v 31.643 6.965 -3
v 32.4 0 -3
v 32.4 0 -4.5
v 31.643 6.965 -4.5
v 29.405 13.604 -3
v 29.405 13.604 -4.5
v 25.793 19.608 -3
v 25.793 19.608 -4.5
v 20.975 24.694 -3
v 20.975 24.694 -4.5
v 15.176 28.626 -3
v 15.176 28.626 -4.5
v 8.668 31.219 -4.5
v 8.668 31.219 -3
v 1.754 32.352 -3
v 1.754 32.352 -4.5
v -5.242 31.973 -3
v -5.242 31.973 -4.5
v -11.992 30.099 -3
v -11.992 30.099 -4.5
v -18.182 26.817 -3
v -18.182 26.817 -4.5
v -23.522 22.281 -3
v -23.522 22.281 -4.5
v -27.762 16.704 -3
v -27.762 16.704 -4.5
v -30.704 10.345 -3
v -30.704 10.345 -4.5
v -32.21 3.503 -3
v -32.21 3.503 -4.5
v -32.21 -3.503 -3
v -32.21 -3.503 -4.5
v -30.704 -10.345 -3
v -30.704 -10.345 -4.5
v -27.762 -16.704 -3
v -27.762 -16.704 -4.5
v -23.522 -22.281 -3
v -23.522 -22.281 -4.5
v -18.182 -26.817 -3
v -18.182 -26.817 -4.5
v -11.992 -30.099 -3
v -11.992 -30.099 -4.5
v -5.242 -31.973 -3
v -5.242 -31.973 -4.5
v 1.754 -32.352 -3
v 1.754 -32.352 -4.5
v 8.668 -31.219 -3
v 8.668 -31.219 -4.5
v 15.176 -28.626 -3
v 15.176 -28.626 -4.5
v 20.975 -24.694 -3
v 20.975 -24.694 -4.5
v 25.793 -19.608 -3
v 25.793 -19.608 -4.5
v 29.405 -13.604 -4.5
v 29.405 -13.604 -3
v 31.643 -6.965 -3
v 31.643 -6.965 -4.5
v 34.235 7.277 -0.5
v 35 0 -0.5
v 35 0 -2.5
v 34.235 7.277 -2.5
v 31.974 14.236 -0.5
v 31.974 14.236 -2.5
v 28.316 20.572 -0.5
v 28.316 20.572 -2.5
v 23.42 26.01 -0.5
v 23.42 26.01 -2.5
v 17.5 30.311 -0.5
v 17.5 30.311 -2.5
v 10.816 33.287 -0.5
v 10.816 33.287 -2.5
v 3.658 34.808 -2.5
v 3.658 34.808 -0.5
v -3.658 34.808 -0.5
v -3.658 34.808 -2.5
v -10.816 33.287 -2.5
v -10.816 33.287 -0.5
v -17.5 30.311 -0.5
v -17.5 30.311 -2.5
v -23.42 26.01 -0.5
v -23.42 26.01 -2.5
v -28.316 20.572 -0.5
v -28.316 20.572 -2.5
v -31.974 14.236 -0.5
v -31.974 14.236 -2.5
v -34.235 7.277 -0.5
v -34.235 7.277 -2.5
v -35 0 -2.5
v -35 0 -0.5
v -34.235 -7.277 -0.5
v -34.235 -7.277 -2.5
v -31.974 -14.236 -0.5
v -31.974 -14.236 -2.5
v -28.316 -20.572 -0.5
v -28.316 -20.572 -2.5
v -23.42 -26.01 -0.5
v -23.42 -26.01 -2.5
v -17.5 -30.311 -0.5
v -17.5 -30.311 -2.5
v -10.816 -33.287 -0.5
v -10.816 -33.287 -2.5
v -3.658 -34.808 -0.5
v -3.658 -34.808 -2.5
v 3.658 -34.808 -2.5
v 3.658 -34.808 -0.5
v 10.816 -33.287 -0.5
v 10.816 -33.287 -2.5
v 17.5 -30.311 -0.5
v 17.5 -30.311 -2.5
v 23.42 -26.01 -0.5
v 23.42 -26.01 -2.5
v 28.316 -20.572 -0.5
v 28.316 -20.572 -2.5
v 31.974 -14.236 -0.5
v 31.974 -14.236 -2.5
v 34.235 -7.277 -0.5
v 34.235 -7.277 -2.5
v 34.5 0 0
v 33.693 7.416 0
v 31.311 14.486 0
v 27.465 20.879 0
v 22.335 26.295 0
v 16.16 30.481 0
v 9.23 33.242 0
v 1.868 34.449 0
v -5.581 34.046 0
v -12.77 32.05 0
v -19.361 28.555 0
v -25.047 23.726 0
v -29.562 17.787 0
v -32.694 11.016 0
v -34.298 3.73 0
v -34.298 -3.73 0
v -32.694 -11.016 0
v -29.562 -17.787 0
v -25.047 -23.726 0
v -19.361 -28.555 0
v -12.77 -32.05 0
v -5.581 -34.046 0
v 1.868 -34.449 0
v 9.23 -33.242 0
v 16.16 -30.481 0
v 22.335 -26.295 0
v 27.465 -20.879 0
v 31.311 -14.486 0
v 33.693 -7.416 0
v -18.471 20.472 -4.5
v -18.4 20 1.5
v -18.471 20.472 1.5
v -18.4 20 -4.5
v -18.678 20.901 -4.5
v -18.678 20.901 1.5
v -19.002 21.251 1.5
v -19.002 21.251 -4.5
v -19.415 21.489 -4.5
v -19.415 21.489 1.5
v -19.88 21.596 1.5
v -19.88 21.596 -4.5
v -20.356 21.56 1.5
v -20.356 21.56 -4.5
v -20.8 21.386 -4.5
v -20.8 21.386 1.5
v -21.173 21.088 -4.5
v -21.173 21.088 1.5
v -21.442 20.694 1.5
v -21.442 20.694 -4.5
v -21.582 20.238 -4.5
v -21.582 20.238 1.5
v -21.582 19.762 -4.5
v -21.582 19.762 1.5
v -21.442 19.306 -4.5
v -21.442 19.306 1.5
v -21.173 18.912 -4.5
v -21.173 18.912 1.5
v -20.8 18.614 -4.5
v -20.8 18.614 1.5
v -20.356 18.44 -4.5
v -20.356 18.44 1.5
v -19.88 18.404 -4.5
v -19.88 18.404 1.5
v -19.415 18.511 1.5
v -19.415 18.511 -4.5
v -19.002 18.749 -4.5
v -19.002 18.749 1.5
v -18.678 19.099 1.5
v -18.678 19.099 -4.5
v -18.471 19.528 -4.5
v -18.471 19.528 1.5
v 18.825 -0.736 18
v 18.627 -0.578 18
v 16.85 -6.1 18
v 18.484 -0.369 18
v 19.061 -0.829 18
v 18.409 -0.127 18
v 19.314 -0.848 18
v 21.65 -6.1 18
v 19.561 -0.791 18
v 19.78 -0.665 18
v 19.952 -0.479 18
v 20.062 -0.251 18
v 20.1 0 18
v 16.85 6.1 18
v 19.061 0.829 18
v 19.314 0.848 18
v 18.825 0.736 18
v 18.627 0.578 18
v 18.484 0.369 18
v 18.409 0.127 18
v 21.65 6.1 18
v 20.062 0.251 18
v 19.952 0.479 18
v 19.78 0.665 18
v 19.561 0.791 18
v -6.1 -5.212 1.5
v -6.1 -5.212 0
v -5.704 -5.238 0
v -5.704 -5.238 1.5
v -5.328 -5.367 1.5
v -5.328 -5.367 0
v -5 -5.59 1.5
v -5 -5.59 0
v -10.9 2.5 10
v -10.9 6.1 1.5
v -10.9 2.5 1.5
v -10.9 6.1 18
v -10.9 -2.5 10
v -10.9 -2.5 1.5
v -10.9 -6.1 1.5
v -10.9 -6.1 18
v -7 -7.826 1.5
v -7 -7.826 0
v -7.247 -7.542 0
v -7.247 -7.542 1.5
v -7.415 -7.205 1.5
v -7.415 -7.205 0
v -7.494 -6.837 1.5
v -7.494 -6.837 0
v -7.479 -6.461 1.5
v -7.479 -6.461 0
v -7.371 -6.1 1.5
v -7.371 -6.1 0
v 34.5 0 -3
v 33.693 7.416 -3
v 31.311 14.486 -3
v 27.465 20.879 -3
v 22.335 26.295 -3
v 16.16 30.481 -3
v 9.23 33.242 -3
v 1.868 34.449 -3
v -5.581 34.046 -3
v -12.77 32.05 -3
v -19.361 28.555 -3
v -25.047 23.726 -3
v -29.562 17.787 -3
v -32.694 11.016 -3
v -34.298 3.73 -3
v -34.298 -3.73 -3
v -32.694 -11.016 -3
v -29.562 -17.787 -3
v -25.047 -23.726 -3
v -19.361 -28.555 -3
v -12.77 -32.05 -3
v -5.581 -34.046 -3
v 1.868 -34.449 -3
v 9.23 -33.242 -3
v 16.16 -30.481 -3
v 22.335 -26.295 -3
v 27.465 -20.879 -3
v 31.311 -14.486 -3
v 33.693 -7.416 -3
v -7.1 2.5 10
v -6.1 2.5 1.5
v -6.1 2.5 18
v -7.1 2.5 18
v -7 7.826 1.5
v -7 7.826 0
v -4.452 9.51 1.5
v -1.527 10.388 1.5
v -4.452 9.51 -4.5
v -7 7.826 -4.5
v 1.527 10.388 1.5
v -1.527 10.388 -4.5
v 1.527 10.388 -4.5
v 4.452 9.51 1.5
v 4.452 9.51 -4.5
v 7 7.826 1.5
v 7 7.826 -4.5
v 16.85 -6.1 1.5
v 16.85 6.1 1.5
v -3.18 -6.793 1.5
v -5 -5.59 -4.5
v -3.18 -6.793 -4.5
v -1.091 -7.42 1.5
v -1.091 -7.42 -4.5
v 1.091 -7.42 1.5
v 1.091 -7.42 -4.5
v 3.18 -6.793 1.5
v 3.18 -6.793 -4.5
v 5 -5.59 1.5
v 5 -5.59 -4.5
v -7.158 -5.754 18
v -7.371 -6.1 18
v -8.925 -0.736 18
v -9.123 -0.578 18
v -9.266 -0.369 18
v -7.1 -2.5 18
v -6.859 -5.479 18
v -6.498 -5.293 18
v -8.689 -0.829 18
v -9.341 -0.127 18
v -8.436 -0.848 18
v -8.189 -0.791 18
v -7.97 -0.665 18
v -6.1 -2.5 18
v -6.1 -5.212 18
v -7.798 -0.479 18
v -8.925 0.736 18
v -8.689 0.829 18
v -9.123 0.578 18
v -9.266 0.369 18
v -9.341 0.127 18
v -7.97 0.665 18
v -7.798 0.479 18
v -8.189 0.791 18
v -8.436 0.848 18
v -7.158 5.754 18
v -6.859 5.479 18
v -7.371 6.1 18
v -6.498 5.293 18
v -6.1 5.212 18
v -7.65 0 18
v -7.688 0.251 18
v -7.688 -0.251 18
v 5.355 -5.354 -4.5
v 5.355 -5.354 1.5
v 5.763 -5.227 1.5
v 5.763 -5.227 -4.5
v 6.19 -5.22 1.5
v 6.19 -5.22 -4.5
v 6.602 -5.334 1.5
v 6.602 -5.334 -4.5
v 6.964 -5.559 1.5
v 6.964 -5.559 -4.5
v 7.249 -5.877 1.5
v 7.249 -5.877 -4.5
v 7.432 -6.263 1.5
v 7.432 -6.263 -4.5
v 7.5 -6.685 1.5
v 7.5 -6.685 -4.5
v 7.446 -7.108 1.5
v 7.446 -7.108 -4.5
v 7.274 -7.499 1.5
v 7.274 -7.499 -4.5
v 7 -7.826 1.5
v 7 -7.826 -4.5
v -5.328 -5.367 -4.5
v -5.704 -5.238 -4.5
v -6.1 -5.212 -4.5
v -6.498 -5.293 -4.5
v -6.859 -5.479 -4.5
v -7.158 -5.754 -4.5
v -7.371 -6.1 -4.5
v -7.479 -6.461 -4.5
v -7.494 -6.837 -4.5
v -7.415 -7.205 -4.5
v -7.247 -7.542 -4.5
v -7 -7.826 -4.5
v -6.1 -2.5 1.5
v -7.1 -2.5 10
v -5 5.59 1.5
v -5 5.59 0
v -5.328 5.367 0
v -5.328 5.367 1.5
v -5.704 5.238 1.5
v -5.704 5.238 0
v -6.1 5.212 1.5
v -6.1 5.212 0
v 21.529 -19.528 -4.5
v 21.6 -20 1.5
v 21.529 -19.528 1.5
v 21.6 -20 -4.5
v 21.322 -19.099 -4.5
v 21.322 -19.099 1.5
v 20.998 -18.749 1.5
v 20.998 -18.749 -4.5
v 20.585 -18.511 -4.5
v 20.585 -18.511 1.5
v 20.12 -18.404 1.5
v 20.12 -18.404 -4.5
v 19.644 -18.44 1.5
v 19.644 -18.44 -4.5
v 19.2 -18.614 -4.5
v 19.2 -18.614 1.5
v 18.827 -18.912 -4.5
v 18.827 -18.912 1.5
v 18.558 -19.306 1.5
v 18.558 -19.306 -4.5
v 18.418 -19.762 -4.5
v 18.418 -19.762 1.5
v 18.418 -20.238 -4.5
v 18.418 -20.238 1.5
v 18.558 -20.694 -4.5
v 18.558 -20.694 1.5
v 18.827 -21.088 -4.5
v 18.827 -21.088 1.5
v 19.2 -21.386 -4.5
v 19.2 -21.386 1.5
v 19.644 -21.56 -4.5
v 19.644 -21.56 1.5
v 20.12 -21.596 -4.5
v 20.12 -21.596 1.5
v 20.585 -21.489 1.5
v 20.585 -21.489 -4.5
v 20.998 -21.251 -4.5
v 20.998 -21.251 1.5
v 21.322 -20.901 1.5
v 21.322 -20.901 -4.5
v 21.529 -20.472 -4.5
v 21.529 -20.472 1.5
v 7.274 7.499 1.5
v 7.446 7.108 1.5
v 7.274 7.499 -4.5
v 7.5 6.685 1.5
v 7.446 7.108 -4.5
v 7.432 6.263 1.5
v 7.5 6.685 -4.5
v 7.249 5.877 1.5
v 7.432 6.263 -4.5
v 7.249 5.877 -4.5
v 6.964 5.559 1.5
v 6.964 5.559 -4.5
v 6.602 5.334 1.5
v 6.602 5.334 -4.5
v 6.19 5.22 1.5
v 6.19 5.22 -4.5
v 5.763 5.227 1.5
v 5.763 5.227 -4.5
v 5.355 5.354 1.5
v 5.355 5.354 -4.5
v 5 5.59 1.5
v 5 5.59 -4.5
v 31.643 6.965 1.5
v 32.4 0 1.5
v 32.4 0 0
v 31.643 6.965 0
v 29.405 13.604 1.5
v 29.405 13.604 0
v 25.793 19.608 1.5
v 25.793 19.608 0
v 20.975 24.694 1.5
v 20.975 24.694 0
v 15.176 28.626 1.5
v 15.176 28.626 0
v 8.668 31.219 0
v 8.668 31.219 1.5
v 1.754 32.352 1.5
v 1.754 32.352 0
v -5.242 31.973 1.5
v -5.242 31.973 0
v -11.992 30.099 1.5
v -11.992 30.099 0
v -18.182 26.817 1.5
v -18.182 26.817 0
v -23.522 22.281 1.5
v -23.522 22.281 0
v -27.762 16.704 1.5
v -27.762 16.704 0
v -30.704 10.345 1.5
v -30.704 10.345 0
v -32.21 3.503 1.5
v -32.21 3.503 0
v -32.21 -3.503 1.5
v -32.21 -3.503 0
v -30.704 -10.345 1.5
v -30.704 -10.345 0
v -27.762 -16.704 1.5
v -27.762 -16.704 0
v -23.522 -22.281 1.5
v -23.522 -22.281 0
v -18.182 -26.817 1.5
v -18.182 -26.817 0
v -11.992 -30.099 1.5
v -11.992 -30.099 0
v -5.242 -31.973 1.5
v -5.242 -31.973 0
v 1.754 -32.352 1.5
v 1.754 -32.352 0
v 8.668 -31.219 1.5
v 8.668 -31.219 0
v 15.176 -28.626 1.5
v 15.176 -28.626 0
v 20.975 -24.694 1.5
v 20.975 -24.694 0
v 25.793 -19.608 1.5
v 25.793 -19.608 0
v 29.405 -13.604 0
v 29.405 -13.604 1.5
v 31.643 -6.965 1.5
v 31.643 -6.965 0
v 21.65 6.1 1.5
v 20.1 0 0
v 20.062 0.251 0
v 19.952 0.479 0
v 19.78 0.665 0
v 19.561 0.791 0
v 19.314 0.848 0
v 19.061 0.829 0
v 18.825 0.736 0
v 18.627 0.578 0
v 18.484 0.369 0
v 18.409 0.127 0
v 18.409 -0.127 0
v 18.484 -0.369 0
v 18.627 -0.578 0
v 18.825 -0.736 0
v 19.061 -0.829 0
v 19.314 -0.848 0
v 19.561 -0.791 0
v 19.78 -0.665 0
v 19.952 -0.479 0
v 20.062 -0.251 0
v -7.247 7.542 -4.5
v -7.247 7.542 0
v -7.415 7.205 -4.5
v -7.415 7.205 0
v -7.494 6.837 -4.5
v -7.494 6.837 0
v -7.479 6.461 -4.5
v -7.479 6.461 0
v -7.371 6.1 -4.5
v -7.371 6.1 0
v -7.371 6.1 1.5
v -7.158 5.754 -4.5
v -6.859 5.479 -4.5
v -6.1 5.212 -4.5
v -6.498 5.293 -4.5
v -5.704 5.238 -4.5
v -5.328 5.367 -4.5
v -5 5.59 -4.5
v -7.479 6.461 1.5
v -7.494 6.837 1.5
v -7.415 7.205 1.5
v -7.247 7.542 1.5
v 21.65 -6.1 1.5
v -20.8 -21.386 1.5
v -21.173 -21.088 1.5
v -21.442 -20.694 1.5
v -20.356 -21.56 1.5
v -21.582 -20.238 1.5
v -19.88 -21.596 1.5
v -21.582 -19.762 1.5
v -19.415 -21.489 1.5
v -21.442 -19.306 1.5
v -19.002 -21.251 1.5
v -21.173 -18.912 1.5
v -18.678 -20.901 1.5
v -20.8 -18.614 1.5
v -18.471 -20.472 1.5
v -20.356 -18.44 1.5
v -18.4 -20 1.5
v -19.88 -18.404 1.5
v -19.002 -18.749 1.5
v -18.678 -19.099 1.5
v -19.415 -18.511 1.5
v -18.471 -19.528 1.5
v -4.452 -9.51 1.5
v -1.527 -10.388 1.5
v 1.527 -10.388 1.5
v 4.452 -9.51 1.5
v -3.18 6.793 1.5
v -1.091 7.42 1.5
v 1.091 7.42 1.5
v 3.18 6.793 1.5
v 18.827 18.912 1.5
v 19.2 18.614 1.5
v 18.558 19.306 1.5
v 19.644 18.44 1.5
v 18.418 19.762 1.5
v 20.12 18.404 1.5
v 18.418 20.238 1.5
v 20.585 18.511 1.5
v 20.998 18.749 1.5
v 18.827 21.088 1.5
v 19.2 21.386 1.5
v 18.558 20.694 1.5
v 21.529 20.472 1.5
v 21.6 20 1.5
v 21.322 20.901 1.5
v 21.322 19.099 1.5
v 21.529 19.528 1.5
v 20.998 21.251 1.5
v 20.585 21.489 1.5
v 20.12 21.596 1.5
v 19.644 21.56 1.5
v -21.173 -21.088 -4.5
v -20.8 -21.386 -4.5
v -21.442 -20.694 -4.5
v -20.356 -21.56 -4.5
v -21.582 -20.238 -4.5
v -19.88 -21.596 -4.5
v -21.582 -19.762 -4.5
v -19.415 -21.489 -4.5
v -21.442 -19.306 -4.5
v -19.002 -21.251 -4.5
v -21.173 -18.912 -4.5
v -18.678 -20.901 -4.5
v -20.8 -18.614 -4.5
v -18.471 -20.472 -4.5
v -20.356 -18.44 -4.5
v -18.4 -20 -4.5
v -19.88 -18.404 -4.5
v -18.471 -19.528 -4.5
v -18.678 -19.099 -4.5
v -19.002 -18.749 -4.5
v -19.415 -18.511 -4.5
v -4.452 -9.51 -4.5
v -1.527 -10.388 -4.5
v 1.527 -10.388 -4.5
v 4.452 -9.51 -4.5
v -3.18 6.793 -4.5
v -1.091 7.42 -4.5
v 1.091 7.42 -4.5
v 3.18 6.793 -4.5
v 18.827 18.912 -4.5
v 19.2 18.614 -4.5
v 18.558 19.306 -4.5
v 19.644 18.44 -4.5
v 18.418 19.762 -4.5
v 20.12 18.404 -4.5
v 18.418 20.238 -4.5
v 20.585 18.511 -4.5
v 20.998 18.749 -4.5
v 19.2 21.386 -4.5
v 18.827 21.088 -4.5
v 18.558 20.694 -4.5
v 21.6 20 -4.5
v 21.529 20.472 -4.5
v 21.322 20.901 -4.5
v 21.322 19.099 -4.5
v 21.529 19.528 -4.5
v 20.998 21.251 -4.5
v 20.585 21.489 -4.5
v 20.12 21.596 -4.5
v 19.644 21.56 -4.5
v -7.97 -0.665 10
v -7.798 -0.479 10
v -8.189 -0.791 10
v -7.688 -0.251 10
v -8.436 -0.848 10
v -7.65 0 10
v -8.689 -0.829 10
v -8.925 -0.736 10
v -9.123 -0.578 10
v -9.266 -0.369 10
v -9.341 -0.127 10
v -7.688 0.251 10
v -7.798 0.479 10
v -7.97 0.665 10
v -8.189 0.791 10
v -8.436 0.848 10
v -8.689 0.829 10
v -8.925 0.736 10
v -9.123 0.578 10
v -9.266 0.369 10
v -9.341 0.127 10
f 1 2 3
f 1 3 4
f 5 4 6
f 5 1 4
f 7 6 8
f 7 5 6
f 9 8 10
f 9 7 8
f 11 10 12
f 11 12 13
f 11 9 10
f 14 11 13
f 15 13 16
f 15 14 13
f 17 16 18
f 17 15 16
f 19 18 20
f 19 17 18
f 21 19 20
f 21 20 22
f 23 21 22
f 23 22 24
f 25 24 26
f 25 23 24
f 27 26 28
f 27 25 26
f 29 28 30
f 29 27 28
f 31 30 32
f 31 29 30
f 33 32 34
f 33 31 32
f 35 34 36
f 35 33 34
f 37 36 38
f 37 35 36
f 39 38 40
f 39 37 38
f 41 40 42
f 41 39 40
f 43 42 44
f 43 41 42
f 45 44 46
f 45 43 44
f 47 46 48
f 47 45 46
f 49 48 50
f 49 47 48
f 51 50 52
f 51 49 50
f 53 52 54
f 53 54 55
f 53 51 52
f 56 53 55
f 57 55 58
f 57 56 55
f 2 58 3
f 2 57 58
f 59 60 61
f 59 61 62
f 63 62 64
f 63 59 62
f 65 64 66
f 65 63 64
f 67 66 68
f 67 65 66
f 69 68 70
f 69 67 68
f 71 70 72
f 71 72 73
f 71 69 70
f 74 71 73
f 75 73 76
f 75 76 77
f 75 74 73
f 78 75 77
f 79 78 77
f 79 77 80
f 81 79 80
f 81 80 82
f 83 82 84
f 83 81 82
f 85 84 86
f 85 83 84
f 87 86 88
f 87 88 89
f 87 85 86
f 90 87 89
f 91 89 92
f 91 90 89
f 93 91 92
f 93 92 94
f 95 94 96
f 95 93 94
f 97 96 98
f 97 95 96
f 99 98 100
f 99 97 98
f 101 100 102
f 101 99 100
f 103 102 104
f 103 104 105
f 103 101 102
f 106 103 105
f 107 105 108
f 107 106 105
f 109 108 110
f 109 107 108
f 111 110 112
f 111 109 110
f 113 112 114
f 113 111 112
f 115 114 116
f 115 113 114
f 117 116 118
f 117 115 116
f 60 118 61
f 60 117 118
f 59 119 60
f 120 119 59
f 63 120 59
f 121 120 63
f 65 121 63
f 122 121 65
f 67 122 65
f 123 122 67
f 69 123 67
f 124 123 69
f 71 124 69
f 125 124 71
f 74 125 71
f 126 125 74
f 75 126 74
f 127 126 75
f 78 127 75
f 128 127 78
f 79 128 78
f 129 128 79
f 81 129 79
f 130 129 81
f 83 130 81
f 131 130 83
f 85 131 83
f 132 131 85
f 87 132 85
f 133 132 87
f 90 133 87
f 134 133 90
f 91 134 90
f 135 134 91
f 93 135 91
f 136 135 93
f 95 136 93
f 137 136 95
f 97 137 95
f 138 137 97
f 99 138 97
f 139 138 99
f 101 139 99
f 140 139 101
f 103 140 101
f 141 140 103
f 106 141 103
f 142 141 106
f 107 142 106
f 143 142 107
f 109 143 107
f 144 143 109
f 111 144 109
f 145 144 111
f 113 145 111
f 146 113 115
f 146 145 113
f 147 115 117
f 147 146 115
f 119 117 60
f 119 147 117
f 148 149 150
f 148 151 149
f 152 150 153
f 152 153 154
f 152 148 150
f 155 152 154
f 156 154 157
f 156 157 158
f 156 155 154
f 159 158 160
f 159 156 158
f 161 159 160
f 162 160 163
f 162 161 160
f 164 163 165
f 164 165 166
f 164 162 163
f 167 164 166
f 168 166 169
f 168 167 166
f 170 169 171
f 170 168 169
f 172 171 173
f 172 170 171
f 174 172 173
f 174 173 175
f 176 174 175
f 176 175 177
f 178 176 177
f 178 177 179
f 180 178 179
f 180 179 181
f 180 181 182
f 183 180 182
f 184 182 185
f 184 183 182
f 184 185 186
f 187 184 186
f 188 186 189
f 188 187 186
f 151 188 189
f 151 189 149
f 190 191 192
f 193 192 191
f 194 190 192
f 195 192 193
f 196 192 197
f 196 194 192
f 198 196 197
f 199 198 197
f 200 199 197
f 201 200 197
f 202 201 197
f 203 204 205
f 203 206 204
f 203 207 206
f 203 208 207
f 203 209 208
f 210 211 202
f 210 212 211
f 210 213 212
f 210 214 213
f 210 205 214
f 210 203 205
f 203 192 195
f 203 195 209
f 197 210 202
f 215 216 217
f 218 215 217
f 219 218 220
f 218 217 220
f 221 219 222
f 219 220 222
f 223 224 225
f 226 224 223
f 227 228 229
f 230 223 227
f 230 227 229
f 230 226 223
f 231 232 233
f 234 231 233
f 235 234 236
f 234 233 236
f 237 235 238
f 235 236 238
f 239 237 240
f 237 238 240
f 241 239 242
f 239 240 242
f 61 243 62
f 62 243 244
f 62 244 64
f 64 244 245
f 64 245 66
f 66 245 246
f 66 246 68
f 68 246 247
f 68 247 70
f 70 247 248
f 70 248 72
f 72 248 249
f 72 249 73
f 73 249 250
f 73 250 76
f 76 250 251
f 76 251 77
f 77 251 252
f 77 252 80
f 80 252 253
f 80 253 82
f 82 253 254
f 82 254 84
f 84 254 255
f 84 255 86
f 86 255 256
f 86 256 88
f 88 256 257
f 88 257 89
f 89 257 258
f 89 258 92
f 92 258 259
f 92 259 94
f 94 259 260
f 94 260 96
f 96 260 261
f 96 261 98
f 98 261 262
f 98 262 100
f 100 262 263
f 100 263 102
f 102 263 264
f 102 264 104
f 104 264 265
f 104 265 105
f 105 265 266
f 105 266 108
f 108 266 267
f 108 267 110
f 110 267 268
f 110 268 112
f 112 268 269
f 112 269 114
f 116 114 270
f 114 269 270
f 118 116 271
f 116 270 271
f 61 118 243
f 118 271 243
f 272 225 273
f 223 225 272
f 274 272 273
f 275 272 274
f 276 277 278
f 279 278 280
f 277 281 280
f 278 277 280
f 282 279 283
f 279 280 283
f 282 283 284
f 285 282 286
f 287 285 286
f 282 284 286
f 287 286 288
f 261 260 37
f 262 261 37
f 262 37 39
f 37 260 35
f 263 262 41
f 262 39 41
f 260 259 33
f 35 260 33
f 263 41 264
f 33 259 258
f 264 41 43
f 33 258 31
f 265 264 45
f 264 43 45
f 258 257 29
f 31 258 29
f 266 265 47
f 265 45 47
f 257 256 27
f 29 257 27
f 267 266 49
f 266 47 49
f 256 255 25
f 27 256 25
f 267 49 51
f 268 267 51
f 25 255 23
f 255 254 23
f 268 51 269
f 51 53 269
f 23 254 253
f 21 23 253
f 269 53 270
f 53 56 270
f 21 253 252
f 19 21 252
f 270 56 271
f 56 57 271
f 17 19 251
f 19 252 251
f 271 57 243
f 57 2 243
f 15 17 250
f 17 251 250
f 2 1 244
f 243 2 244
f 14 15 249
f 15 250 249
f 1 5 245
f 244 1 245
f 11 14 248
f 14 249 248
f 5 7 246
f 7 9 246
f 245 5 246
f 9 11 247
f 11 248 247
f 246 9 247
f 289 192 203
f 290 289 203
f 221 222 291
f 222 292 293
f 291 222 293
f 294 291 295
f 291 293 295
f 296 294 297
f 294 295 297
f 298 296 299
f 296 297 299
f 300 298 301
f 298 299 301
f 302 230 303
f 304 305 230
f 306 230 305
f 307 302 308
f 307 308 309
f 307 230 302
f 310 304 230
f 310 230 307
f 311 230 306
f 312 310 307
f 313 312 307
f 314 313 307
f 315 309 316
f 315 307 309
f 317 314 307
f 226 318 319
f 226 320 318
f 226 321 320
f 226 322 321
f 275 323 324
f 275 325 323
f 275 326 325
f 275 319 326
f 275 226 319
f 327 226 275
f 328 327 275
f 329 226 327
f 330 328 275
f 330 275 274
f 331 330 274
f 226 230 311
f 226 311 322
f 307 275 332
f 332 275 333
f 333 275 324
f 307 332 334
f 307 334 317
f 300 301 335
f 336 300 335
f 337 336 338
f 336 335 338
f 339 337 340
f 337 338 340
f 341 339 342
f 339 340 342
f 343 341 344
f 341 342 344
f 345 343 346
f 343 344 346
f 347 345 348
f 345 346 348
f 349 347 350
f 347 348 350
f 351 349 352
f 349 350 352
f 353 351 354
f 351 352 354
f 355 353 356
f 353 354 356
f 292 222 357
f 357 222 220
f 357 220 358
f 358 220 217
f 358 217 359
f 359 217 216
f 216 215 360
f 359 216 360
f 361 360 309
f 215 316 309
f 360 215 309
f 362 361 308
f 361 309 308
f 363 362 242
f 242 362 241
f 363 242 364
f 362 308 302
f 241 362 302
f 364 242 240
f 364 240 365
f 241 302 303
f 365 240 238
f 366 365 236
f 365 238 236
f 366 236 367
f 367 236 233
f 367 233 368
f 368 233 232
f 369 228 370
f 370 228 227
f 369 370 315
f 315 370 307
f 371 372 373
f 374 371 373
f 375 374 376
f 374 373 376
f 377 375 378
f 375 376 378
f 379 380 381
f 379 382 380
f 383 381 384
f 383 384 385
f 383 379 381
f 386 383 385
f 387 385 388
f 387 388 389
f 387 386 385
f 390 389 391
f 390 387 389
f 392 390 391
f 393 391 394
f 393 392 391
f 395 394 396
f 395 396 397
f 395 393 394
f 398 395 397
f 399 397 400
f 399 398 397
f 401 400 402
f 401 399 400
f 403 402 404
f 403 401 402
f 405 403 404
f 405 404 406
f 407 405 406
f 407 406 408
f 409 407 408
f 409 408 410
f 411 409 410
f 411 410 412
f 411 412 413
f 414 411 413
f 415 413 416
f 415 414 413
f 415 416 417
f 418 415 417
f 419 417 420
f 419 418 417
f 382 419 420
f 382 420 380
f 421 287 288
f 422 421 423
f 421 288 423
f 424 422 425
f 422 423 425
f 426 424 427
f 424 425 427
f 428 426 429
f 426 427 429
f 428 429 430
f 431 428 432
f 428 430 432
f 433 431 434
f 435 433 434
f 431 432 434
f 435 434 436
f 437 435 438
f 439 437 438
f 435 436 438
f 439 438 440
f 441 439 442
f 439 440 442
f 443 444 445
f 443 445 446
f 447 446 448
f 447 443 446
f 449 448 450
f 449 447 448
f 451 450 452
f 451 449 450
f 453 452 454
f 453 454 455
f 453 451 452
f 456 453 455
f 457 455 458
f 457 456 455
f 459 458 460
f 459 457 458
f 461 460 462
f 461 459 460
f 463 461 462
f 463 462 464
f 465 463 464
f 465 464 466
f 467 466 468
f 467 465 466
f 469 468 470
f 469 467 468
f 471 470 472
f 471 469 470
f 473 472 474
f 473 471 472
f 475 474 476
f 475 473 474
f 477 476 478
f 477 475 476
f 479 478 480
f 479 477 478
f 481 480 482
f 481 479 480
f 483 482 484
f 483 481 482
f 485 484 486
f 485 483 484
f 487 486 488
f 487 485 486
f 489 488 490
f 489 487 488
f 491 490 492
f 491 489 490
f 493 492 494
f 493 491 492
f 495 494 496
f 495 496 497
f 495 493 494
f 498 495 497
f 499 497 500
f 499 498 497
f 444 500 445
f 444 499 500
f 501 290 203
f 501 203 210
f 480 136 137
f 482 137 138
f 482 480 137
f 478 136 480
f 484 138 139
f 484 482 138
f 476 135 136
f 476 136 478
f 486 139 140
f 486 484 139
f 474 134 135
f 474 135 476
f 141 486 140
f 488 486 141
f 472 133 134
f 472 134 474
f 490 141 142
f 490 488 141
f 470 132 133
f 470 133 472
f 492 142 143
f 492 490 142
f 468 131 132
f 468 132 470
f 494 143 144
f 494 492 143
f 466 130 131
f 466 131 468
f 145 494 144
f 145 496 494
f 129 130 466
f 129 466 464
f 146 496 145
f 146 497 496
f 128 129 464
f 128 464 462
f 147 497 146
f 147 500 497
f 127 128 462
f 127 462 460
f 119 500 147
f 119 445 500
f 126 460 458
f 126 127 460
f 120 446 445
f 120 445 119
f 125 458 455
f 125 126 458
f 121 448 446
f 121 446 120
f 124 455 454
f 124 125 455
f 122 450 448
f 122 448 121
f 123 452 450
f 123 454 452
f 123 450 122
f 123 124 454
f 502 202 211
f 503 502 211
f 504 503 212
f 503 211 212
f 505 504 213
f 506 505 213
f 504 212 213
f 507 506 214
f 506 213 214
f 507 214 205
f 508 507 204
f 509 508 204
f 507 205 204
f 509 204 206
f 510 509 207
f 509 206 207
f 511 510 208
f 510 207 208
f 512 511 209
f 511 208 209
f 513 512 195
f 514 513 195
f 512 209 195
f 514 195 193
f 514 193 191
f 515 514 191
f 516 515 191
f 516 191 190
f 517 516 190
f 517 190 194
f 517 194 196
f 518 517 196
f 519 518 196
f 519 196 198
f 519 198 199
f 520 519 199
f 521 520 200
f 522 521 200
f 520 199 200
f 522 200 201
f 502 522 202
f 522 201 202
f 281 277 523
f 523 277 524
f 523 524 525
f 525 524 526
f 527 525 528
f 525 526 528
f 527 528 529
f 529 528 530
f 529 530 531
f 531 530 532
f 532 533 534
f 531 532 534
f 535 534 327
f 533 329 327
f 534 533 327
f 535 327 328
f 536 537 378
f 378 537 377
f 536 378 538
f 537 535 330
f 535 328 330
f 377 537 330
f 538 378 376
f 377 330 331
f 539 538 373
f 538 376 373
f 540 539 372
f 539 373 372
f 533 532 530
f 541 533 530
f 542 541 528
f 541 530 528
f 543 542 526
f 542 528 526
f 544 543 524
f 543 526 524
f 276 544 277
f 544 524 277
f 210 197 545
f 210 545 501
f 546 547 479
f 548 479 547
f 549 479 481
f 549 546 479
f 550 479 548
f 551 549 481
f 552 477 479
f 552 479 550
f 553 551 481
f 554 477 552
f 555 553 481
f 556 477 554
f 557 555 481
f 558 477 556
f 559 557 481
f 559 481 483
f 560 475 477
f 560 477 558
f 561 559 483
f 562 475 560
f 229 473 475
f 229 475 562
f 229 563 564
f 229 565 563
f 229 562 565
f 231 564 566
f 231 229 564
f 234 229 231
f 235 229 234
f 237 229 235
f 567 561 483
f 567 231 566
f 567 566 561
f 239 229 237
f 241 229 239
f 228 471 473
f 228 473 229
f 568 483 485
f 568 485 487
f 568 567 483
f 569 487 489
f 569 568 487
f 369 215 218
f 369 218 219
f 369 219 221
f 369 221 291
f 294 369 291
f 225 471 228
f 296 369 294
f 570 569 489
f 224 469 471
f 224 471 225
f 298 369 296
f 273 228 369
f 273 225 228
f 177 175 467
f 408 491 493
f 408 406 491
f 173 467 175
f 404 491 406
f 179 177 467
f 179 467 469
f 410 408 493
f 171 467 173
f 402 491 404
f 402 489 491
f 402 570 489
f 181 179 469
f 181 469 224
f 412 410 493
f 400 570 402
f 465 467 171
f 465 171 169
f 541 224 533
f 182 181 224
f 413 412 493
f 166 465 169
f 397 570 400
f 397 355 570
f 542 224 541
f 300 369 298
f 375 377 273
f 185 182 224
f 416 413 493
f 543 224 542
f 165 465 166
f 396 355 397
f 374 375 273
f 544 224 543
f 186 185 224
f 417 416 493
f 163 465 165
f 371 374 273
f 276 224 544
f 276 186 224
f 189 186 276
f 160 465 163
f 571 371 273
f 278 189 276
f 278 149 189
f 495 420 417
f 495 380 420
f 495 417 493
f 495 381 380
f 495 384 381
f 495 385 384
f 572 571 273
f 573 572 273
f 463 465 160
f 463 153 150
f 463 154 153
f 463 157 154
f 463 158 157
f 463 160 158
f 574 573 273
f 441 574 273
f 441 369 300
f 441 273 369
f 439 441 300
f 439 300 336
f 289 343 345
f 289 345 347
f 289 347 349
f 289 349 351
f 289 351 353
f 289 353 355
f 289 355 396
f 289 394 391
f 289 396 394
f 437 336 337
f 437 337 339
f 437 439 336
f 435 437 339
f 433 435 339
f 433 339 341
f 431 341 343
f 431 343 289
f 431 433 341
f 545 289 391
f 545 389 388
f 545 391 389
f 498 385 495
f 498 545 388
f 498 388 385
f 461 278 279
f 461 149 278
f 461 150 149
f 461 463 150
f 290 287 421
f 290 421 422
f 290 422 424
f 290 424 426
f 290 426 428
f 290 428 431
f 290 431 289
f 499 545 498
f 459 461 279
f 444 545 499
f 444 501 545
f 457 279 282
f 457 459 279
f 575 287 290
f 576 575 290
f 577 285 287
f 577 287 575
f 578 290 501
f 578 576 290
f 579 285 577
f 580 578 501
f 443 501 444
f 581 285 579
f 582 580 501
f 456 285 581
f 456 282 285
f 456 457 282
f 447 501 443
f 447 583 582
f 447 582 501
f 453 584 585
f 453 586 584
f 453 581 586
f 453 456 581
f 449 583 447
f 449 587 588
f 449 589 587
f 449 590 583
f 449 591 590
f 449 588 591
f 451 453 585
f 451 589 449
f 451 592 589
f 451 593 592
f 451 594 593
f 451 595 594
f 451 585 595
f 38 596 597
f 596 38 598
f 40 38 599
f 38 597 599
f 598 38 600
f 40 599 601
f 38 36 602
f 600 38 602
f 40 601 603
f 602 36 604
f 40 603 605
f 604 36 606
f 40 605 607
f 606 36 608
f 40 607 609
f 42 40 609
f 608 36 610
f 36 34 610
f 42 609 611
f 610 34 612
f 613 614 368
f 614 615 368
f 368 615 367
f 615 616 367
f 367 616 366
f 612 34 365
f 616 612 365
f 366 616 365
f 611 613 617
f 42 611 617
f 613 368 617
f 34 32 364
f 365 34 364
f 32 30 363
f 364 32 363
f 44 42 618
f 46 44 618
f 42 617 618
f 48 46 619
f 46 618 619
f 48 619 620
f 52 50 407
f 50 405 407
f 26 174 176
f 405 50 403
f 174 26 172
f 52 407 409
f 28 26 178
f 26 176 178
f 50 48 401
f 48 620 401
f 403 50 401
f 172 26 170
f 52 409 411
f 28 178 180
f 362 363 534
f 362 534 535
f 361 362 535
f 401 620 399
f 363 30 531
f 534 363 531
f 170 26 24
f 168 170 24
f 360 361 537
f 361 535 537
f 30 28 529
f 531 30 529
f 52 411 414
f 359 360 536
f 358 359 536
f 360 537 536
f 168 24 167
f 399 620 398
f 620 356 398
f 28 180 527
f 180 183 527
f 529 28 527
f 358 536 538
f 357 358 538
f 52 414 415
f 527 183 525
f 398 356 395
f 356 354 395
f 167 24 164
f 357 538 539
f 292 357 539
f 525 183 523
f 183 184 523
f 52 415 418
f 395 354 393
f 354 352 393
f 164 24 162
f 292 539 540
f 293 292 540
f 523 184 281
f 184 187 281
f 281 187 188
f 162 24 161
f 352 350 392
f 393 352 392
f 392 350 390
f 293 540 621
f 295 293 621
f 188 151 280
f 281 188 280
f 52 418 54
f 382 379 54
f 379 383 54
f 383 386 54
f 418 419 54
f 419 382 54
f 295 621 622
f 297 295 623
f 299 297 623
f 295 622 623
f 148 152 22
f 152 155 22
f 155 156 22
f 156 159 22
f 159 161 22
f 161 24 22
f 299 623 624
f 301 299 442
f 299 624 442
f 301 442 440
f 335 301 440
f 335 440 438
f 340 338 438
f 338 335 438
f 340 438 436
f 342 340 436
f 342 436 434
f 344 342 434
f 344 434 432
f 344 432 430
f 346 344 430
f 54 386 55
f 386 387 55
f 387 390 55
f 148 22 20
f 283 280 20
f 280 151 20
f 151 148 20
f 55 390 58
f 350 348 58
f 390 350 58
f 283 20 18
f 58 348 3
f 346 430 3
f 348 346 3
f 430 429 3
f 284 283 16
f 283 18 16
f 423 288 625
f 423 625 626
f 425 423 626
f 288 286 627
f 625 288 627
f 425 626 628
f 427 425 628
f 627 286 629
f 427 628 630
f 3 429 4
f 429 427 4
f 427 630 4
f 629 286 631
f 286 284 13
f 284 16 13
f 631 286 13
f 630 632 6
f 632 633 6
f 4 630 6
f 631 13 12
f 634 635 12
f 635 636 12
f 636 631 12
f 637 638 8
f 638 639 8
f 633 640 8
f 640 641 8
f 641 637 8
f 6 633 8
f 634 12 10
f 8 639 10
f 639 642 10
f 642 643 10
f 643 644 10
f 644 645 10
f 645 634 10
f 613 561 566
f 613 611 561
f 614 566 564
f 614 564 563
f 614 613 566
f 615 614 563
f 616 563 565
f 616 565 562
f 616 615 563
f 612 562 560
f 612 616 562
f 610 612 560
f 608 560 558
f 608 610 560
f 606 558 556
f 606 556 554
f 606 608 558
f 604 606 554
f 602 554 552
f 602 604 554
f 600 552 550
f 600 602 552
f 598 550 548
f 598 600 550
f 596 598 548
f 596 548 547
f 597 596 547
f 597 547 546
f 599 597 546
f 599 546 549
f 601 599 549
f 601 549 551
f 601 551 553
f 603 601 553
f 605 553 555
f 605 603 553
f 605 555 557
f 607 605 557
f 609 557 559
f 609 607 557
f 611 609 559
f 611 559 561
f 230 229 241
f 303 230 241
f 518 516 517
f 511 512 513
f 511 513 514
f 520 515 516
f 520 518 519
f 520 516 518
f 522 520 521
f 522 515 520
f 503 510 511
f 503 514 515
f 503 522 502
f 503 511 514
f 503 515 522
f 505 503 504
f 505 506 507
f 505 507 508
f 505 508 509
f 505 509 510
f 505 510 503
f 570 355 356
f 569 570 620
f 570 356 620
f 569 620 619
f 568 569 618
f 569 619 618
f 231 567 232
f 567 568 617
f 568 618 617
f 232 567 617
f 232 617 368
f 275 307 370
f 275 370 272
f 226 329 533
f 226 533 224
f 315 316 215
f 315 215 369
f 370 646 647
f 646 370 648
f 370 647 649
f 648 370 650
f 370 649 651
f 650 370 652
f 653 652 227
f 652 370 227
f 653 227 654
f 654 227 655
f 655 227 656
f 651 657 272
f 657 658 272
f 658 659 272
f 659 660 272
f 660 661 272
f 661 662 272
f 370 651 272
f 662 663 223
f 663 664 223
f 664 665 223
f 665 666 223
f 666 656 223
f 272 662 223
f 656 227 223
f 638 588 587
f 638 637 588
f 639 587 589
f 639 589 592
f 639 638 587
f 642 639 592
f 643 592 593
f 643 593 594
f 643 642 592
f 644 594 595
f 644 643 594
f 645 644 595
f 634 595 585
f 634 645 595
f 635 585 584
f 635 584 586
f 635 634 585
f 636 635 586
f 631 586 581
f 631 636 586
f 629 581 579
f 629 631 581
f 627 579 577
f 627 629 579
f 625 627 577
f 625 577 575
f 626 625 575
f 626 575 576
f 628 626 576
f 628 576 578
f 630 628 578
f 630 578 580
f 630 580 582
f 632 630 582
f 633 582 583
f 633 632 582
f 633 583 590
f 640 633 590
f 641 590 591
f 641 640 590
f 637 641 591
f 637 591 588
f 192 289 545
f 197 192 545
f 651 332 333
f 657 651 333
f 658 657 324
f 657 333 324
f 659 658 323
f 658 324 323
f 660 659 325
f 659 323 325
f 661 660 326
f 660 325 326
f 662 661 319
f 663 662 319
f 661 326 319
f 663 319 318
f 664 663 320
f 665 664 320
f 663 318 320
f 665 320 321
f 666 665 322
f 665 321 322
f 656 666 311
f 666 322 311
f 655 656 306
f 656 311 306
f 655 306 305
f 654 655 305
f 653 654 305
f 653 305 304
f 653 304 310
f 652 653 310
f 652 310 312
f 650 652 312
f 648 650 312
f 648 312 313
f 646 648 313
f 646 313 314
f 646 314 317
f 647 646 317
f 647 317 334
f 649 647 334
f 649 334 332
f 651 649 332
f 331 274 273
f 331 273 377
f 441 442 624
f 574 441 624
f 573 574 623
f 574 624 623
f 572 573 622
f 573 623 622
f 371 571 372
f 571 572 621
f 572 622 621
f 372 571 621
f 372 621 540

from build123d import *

# Parameters (mm, degrees)
SKIZZE1_R                       = 32.4
SKIZZE1_R_2                     = 1.8
AUFSATZ_LINEAR_AUSTRAGEN1_DEPTH = 3
SCHNITT_LINEAR_AUSTRAGEN1_DEPTH = 46.918623673
AUFSATZ_LINEAR_START            = 18
SKIZZE4_R                       = 0.85
SKIZZE4_W                       = 4.8
SKIZZE4_H                       = 12.19937625
AUFSATZ_LINEAR_AUSTRAGEN2_DEPTH = 18
SKIZZE5_W                       = 2
SKIZZE5_H                       = 5
SCHNITT_LINEAR_AUSTRAGEN2_DEPTH = 18
SKIZZE6_W                       = 10
SKIZZE6_H                       = 5
SCHNITT_LINEAR_AUSTRAGEN3_DEPTH = 18
FL_CHE_VERSCHIEBEN1_BY          = 1.5
SKIZZE8_R                       = 35
SKIZZE8_R_2                     = 32.4
AUFSATZ_LINEAR_AUSTRAGEN3_DEPTH = 3
SKIZZE9_R                       = 1.8
SKIZZE9_R_2                     = 1.6
AUFSATZ_LINEAR_AUSTRAGEN4_DEPTH = 4.5
FL_CHE_VERSCHIEBEN2_OUTLINE_R   = 35
FL_CHE_VERSCHIEBEN2_OUTLINE_R_2 = 1.6
FL_CHE_VERSCHIEBEN2_OUTLINE_W   = 4.8
FL_CHE_VERSCHIEBEN2_OUTLINE_H   = 12.19937625
FL_CHE_VERSCHIEBEN2_DEPTH       = 1.5
SKIZZE10_R                      = 36.675991258
SKIZZE10_R_2                    = 32.4
SCHNITT_LINEAR_AUSTRAGEN4_DEPTH = 1.5
FASE1_SIZE                      = 0.5


# Read off the part's stored shape, not the designer's step: Fläche verschieben2
with BuildPart() as part:
    # Skizze1 → Aufsatz-Linear austragen1 (new body)
    with BuildSketch(Plane.XY):
        Circle(SKIZZE1_R)
        with Locations((-20, -20)):
            Circle(SKIZZE1_R_2, mode=Mode.SUBTRACT)
        with Locations((20, -20)):
            Circle(SKIZZE1_R_2, mode=Mode.SUBTRACT)
        with Locations((20, 20)):
            Circle(SKIZZE1_R_2, mode=Mode.SUBTRACT)
        with Locations((-20, 20)):
            Circle(SKIZZE1_R_2, mode=Mode.SUBTRACT)
    extrude(amount=-AUFSATZ_LINEAR_AUSTRAGEN1_DEPTH)

    # Skizze2 → Schnitt-Linear austragen1 (cut, through all)
    with BuildSketch(Plane.XY):
        with BuildLine():
            ThreePointArc((5, 5.590169944), (0, 7.5), (-5, 5.590169944))
            ThreePointArc((-5, 5.590169944), (-5.511799249, 5.289873919), (-6.1, 5.211540978))
            ThreePointArc((-6.1, 5.211540978), (-6.859313681, 5.478740636), (-7.371163001, 6.1))
            ThreePointArc((-7.371163001, 6.1), (-7.466484857, 7.023516737), (-7, 7.826237921))
            ThreePointArc((-7, 7.826237921), (0, 10.5), (7, 7.826237921))
            ThreePointArc((7, 7.826237921), (7.118033989, 5.708203932), (5, 5.590169944))
        make_face()
        with BuildLine():
            ThreePointArc((-7, -7.826237921), (0, -10.5), (7, -7.826237921))
            ThreePointArc((7, -7.826237921), (7.118033989, -5.708203932), (5, -5.590169944))
            ThreePointArc((5, -5.590169944), (0, -7.5), (-5, -5.590169944))
            ThreePointArc((-5, -5.590169944), (-5.511799249, -5.289873919), (-6.1, -5.211540978))
            ThreePointArc((-6.1, -5.211540978), (-6.859313681, -5.478740636), (-7.371163001, -6.1))
            ThreePointArc((-7.371163001, -6.1), (-7.466484857, -7.023516737), (-7, -7.826237921))
        make_face()
    extrude(amount=-SCHNITT_LINEAR_AUSTRAGEN1_DEPTH, mode=Mode.SUBTRACT)

    # Skizze4 → Aufsatz-Linear austragen2 (add)
    # profile 1 of 2: a face of its own
    with BuildSketch(Plane.XY.offset(AUFSATZ_LINEAR_START)):
        with BuildLine():
            Line((-10.9, 6.1), (-10.9, -6.1))
            Line((-10.9, -6.1), (-7.371163001, -6.1))
            ThreePointArc((-7.371163001, -6.1), (-6.859313681, -5.478740636), (-6.1, -5.211540978))
            Line((-6.1, -5.211540978), (-6.1, 0.782623792))
            Line((-6.1, 0.782623792), (-6.1, 5.211540978))
            ThreePointArc((-6.1, 5.211540978), (-6.859313681, 5.478740636), (-7.371163001, 6.1))
            Line((-7.371163001, 6.1), (-10.9, 6.1))
        make_face()
        with Locations((-8.5, 0)):
            Circle(SKIZZE4_R, mode=Mode.SUBTRACT)
    # profile 2 of 2: a face of its own
    with BuildSketch(Plane.XY.offset(AUFSATZ_LINEAR_START)):
        with Locations((19.25, 0)):
            Rectangle(SKIZZE4_W, SKIZZE4_H)
        with Locations((19.25, 0)):
            Circle(SKIZZE4_R, mode=Mode.SUBTRACT)
    extrude(amount=-AUFSATZ_LINEAR_AUSTRAGEN2_DEPTH)

    # Skizze5 → Schnitt-Linear austragen2 (cut)
    with BuildSketch(Plane.XY.offset(18)):
        with Locations((-6.1, 0)):
            Rectangle(SKIZZE5_W, SKIZZE5_H)
    extrude(amount=-SCHNITT_LINEAR_AUSTRAGEN2_DEPTH, mode=Mode.SUBTRACT)

    # Skizze6 → Schnitt-Linear austragen3 (cut)
    with BuildSketch(Plane.ZY.offset(10.9)):
        with Locations((5, 0)):
            Rectangle(SKIZZE6_W, SKIZZE6_H)
    extrude(amount=-SCHNITT_LINEAR_AUSTRAGEN3_DEPTH, mode=Mode.SUBTRACT)

    # Fläche verschieben1: a face moved outward by 1.5
    extrude(part.faces().sort_by_distance((0, 0, -3))[0], amount=FL_CHE_VERSCHIEBEN1_BY, dir=(0, 0, -1))

    # Skizze8 → Aufsatz-Linear austragen3 (add)
    with BuildSketch(Plane.XY):
        Circle(SKIZZE8_R)
        Circle(SKIZZE8_R_2, mode=Mode.SUBTRACT)
    extrude(amount=-AUFSATZ_LINEAR_AUSTRAGEN3_DEPTH)

    # Skizze9 → Aufsatz-Linear austragen4 (add)
    # profile 1 of 4: a face of its own
    with BuildSketch(Plane.XY):
        with Locations((-20, 20)):
            Circle(SKIZZE9_R)
        with Locations((-20, 20)):
            Circle(SKIZZE9_R_2, mode=Mode.SUBTRACT)
    # profile 2 of 4: a face of its own
    with BuildSketch(Plane.XY):
        with Locations((20, 20)):
            Circle(SKIZZE9_R)
        with Locations((20, 20)):
            Circle(SKIZZE9_R_2, mode=Mode.SUBTRACT)
    # profile 3 of 4: a face of its own
    with BuildSketch(Plane.XY):
        with Locations((20, -20)):
            Circle(SKIZZE9_R)
        with Locations((20, -20)):
            Circle(SKIZZE9_R_2, mode=Mode.SUBTRACT)
    # profile 4 of 4: a face of its own
    with BuildSketch(Plane.XY):
        with Locations((-20, -20)):
            Circle(SKIZZE9_R)
        with Locations((-20, -20)):
            Circle(SKIZZE9_R_2, mode=Mode.SUBTRACT)
    extrude(amount=-AUFSATZ_LINEAR_AUSTRAGEN4_DEPTH)

    # Fläche verschieben2 outline → Fläche verschieben2 (add)
    with BuildSketch(Plane.XY):
        Circle(FL_CHE_VERSCHIEBEN2_OUTLINE_R)
        with Locations((-20, -20)):
            Circle(FL_CHE_VERSCHIEBEN2_OUTLINE_R_2, mode=Mode.SUBTRACT)
        with BuildLine():
            ThreePointArc((7, -7.826237921), (0, -10.5), (-7, -7.826237921))
            ThreePointArc((-7, -7.826237921), (-7.466484857, -7.023516737), (-7.371163002, -6.1))
            Line((-7.371163002, -6.1), (-10.9, -6.1))
            Line((-10.9, -6.1), (-10.9, -2.5))
            Line((-10.9, -2.5), (-6.1, -2.5))
            Line((-6.1, -2.5), (-6.1, -5.211540977))
            ThreePointArc((-6.1, -5.211540977), (-5.511799249, -5.289873919), (-5, -5.590169944))
            ThreePointArc((-5, -5.590169944), (0, -7.5), (5, -5.590169944))
            ThreePointArc((5, -5.590169944), (7.118033989, -5.708203932), (7, -7.826237921))
        make_face(mode=Mode.SUBTRACT)
        with Locations((20, -20)):
            Circle(FL_CHE_VERSCHIEBEN2_OUTLINE_R_2, mode=Mode.SUBTRACT)
        with BuildLine():
            Line((-6.1, 2.5), (-10.9, 2.5))
            Line((-10.9, 2.5), (-10.9, 6.1))
            Line((-10.9, 6.1), (-7.371163002, 6.1))
            ThreePointArc((-7.371163002, 6.1), (-7.466484857, 7.023516737), (-7, 7.826237921))
            ThreePointArc((-7, 7.826237921), (0, 10.5), (7, 7.826237921))
            ThreePointArc((7, 7.826237921), (7.118033989, 5.708203932), (5, 5.590169944))
            ThreePointArc((5, 5.590169944), (0, 7.5), (-5, 5.590169944))
            ThreePointArc((-5, 5.590169944), (-5.511799249, 5.289873919), (-6.1, 5.211540977))
            Line((-6.1, 5.211540977), (-6.1, 2.5))
        make_face(mode=Mode.SUBTRACT)
        with Locations((-20, 20)):
            Circle(FL_CHE_VERSCHIEBEN2_OUTLINE_R_2, mode=Mode.SUBTRACT)
        with Locations((19.25, 0)):
            Rectangle(FL_CHE_VERSCHIEBEN2_OUTLINE_W, FL_CHE_VERSCHIEBEN2_OUTLINE_H, mode=Mode.SUBTRACT)
        with Locations((20, 20)):
            Circle(FL_CHE_VERSCHIEBEN2_OUTLINE_R_2, mode=Mode.SUBTRACT)
    extrude(amount=FL_CHE_VERSCHIEBEN2_DEPTH)

    # Skizze10 → Schnitt-Linear austragen4 (cut)
    with BuildSketch(Plane.XY.offset(1.5)):
        Circle(SKIZZE10_R)
        Circle(SKIZZE10_R_2, mode=Mode.SUBTRACT)
    extrude(amount=-SCHNITT_LINEAR_AUSTRAGEN4_DEPTH, mode=Mode.SUBTRACT)

    # Fase1
    fase1_edges = [part.edges().sort_by_distance(p)[0] for p in [
        (-35, 0, -3),
        (-35, 0, 0),
    ]]
    chamfer(fase1_edges, length=FASE1_SIZE)


solid = part.part
